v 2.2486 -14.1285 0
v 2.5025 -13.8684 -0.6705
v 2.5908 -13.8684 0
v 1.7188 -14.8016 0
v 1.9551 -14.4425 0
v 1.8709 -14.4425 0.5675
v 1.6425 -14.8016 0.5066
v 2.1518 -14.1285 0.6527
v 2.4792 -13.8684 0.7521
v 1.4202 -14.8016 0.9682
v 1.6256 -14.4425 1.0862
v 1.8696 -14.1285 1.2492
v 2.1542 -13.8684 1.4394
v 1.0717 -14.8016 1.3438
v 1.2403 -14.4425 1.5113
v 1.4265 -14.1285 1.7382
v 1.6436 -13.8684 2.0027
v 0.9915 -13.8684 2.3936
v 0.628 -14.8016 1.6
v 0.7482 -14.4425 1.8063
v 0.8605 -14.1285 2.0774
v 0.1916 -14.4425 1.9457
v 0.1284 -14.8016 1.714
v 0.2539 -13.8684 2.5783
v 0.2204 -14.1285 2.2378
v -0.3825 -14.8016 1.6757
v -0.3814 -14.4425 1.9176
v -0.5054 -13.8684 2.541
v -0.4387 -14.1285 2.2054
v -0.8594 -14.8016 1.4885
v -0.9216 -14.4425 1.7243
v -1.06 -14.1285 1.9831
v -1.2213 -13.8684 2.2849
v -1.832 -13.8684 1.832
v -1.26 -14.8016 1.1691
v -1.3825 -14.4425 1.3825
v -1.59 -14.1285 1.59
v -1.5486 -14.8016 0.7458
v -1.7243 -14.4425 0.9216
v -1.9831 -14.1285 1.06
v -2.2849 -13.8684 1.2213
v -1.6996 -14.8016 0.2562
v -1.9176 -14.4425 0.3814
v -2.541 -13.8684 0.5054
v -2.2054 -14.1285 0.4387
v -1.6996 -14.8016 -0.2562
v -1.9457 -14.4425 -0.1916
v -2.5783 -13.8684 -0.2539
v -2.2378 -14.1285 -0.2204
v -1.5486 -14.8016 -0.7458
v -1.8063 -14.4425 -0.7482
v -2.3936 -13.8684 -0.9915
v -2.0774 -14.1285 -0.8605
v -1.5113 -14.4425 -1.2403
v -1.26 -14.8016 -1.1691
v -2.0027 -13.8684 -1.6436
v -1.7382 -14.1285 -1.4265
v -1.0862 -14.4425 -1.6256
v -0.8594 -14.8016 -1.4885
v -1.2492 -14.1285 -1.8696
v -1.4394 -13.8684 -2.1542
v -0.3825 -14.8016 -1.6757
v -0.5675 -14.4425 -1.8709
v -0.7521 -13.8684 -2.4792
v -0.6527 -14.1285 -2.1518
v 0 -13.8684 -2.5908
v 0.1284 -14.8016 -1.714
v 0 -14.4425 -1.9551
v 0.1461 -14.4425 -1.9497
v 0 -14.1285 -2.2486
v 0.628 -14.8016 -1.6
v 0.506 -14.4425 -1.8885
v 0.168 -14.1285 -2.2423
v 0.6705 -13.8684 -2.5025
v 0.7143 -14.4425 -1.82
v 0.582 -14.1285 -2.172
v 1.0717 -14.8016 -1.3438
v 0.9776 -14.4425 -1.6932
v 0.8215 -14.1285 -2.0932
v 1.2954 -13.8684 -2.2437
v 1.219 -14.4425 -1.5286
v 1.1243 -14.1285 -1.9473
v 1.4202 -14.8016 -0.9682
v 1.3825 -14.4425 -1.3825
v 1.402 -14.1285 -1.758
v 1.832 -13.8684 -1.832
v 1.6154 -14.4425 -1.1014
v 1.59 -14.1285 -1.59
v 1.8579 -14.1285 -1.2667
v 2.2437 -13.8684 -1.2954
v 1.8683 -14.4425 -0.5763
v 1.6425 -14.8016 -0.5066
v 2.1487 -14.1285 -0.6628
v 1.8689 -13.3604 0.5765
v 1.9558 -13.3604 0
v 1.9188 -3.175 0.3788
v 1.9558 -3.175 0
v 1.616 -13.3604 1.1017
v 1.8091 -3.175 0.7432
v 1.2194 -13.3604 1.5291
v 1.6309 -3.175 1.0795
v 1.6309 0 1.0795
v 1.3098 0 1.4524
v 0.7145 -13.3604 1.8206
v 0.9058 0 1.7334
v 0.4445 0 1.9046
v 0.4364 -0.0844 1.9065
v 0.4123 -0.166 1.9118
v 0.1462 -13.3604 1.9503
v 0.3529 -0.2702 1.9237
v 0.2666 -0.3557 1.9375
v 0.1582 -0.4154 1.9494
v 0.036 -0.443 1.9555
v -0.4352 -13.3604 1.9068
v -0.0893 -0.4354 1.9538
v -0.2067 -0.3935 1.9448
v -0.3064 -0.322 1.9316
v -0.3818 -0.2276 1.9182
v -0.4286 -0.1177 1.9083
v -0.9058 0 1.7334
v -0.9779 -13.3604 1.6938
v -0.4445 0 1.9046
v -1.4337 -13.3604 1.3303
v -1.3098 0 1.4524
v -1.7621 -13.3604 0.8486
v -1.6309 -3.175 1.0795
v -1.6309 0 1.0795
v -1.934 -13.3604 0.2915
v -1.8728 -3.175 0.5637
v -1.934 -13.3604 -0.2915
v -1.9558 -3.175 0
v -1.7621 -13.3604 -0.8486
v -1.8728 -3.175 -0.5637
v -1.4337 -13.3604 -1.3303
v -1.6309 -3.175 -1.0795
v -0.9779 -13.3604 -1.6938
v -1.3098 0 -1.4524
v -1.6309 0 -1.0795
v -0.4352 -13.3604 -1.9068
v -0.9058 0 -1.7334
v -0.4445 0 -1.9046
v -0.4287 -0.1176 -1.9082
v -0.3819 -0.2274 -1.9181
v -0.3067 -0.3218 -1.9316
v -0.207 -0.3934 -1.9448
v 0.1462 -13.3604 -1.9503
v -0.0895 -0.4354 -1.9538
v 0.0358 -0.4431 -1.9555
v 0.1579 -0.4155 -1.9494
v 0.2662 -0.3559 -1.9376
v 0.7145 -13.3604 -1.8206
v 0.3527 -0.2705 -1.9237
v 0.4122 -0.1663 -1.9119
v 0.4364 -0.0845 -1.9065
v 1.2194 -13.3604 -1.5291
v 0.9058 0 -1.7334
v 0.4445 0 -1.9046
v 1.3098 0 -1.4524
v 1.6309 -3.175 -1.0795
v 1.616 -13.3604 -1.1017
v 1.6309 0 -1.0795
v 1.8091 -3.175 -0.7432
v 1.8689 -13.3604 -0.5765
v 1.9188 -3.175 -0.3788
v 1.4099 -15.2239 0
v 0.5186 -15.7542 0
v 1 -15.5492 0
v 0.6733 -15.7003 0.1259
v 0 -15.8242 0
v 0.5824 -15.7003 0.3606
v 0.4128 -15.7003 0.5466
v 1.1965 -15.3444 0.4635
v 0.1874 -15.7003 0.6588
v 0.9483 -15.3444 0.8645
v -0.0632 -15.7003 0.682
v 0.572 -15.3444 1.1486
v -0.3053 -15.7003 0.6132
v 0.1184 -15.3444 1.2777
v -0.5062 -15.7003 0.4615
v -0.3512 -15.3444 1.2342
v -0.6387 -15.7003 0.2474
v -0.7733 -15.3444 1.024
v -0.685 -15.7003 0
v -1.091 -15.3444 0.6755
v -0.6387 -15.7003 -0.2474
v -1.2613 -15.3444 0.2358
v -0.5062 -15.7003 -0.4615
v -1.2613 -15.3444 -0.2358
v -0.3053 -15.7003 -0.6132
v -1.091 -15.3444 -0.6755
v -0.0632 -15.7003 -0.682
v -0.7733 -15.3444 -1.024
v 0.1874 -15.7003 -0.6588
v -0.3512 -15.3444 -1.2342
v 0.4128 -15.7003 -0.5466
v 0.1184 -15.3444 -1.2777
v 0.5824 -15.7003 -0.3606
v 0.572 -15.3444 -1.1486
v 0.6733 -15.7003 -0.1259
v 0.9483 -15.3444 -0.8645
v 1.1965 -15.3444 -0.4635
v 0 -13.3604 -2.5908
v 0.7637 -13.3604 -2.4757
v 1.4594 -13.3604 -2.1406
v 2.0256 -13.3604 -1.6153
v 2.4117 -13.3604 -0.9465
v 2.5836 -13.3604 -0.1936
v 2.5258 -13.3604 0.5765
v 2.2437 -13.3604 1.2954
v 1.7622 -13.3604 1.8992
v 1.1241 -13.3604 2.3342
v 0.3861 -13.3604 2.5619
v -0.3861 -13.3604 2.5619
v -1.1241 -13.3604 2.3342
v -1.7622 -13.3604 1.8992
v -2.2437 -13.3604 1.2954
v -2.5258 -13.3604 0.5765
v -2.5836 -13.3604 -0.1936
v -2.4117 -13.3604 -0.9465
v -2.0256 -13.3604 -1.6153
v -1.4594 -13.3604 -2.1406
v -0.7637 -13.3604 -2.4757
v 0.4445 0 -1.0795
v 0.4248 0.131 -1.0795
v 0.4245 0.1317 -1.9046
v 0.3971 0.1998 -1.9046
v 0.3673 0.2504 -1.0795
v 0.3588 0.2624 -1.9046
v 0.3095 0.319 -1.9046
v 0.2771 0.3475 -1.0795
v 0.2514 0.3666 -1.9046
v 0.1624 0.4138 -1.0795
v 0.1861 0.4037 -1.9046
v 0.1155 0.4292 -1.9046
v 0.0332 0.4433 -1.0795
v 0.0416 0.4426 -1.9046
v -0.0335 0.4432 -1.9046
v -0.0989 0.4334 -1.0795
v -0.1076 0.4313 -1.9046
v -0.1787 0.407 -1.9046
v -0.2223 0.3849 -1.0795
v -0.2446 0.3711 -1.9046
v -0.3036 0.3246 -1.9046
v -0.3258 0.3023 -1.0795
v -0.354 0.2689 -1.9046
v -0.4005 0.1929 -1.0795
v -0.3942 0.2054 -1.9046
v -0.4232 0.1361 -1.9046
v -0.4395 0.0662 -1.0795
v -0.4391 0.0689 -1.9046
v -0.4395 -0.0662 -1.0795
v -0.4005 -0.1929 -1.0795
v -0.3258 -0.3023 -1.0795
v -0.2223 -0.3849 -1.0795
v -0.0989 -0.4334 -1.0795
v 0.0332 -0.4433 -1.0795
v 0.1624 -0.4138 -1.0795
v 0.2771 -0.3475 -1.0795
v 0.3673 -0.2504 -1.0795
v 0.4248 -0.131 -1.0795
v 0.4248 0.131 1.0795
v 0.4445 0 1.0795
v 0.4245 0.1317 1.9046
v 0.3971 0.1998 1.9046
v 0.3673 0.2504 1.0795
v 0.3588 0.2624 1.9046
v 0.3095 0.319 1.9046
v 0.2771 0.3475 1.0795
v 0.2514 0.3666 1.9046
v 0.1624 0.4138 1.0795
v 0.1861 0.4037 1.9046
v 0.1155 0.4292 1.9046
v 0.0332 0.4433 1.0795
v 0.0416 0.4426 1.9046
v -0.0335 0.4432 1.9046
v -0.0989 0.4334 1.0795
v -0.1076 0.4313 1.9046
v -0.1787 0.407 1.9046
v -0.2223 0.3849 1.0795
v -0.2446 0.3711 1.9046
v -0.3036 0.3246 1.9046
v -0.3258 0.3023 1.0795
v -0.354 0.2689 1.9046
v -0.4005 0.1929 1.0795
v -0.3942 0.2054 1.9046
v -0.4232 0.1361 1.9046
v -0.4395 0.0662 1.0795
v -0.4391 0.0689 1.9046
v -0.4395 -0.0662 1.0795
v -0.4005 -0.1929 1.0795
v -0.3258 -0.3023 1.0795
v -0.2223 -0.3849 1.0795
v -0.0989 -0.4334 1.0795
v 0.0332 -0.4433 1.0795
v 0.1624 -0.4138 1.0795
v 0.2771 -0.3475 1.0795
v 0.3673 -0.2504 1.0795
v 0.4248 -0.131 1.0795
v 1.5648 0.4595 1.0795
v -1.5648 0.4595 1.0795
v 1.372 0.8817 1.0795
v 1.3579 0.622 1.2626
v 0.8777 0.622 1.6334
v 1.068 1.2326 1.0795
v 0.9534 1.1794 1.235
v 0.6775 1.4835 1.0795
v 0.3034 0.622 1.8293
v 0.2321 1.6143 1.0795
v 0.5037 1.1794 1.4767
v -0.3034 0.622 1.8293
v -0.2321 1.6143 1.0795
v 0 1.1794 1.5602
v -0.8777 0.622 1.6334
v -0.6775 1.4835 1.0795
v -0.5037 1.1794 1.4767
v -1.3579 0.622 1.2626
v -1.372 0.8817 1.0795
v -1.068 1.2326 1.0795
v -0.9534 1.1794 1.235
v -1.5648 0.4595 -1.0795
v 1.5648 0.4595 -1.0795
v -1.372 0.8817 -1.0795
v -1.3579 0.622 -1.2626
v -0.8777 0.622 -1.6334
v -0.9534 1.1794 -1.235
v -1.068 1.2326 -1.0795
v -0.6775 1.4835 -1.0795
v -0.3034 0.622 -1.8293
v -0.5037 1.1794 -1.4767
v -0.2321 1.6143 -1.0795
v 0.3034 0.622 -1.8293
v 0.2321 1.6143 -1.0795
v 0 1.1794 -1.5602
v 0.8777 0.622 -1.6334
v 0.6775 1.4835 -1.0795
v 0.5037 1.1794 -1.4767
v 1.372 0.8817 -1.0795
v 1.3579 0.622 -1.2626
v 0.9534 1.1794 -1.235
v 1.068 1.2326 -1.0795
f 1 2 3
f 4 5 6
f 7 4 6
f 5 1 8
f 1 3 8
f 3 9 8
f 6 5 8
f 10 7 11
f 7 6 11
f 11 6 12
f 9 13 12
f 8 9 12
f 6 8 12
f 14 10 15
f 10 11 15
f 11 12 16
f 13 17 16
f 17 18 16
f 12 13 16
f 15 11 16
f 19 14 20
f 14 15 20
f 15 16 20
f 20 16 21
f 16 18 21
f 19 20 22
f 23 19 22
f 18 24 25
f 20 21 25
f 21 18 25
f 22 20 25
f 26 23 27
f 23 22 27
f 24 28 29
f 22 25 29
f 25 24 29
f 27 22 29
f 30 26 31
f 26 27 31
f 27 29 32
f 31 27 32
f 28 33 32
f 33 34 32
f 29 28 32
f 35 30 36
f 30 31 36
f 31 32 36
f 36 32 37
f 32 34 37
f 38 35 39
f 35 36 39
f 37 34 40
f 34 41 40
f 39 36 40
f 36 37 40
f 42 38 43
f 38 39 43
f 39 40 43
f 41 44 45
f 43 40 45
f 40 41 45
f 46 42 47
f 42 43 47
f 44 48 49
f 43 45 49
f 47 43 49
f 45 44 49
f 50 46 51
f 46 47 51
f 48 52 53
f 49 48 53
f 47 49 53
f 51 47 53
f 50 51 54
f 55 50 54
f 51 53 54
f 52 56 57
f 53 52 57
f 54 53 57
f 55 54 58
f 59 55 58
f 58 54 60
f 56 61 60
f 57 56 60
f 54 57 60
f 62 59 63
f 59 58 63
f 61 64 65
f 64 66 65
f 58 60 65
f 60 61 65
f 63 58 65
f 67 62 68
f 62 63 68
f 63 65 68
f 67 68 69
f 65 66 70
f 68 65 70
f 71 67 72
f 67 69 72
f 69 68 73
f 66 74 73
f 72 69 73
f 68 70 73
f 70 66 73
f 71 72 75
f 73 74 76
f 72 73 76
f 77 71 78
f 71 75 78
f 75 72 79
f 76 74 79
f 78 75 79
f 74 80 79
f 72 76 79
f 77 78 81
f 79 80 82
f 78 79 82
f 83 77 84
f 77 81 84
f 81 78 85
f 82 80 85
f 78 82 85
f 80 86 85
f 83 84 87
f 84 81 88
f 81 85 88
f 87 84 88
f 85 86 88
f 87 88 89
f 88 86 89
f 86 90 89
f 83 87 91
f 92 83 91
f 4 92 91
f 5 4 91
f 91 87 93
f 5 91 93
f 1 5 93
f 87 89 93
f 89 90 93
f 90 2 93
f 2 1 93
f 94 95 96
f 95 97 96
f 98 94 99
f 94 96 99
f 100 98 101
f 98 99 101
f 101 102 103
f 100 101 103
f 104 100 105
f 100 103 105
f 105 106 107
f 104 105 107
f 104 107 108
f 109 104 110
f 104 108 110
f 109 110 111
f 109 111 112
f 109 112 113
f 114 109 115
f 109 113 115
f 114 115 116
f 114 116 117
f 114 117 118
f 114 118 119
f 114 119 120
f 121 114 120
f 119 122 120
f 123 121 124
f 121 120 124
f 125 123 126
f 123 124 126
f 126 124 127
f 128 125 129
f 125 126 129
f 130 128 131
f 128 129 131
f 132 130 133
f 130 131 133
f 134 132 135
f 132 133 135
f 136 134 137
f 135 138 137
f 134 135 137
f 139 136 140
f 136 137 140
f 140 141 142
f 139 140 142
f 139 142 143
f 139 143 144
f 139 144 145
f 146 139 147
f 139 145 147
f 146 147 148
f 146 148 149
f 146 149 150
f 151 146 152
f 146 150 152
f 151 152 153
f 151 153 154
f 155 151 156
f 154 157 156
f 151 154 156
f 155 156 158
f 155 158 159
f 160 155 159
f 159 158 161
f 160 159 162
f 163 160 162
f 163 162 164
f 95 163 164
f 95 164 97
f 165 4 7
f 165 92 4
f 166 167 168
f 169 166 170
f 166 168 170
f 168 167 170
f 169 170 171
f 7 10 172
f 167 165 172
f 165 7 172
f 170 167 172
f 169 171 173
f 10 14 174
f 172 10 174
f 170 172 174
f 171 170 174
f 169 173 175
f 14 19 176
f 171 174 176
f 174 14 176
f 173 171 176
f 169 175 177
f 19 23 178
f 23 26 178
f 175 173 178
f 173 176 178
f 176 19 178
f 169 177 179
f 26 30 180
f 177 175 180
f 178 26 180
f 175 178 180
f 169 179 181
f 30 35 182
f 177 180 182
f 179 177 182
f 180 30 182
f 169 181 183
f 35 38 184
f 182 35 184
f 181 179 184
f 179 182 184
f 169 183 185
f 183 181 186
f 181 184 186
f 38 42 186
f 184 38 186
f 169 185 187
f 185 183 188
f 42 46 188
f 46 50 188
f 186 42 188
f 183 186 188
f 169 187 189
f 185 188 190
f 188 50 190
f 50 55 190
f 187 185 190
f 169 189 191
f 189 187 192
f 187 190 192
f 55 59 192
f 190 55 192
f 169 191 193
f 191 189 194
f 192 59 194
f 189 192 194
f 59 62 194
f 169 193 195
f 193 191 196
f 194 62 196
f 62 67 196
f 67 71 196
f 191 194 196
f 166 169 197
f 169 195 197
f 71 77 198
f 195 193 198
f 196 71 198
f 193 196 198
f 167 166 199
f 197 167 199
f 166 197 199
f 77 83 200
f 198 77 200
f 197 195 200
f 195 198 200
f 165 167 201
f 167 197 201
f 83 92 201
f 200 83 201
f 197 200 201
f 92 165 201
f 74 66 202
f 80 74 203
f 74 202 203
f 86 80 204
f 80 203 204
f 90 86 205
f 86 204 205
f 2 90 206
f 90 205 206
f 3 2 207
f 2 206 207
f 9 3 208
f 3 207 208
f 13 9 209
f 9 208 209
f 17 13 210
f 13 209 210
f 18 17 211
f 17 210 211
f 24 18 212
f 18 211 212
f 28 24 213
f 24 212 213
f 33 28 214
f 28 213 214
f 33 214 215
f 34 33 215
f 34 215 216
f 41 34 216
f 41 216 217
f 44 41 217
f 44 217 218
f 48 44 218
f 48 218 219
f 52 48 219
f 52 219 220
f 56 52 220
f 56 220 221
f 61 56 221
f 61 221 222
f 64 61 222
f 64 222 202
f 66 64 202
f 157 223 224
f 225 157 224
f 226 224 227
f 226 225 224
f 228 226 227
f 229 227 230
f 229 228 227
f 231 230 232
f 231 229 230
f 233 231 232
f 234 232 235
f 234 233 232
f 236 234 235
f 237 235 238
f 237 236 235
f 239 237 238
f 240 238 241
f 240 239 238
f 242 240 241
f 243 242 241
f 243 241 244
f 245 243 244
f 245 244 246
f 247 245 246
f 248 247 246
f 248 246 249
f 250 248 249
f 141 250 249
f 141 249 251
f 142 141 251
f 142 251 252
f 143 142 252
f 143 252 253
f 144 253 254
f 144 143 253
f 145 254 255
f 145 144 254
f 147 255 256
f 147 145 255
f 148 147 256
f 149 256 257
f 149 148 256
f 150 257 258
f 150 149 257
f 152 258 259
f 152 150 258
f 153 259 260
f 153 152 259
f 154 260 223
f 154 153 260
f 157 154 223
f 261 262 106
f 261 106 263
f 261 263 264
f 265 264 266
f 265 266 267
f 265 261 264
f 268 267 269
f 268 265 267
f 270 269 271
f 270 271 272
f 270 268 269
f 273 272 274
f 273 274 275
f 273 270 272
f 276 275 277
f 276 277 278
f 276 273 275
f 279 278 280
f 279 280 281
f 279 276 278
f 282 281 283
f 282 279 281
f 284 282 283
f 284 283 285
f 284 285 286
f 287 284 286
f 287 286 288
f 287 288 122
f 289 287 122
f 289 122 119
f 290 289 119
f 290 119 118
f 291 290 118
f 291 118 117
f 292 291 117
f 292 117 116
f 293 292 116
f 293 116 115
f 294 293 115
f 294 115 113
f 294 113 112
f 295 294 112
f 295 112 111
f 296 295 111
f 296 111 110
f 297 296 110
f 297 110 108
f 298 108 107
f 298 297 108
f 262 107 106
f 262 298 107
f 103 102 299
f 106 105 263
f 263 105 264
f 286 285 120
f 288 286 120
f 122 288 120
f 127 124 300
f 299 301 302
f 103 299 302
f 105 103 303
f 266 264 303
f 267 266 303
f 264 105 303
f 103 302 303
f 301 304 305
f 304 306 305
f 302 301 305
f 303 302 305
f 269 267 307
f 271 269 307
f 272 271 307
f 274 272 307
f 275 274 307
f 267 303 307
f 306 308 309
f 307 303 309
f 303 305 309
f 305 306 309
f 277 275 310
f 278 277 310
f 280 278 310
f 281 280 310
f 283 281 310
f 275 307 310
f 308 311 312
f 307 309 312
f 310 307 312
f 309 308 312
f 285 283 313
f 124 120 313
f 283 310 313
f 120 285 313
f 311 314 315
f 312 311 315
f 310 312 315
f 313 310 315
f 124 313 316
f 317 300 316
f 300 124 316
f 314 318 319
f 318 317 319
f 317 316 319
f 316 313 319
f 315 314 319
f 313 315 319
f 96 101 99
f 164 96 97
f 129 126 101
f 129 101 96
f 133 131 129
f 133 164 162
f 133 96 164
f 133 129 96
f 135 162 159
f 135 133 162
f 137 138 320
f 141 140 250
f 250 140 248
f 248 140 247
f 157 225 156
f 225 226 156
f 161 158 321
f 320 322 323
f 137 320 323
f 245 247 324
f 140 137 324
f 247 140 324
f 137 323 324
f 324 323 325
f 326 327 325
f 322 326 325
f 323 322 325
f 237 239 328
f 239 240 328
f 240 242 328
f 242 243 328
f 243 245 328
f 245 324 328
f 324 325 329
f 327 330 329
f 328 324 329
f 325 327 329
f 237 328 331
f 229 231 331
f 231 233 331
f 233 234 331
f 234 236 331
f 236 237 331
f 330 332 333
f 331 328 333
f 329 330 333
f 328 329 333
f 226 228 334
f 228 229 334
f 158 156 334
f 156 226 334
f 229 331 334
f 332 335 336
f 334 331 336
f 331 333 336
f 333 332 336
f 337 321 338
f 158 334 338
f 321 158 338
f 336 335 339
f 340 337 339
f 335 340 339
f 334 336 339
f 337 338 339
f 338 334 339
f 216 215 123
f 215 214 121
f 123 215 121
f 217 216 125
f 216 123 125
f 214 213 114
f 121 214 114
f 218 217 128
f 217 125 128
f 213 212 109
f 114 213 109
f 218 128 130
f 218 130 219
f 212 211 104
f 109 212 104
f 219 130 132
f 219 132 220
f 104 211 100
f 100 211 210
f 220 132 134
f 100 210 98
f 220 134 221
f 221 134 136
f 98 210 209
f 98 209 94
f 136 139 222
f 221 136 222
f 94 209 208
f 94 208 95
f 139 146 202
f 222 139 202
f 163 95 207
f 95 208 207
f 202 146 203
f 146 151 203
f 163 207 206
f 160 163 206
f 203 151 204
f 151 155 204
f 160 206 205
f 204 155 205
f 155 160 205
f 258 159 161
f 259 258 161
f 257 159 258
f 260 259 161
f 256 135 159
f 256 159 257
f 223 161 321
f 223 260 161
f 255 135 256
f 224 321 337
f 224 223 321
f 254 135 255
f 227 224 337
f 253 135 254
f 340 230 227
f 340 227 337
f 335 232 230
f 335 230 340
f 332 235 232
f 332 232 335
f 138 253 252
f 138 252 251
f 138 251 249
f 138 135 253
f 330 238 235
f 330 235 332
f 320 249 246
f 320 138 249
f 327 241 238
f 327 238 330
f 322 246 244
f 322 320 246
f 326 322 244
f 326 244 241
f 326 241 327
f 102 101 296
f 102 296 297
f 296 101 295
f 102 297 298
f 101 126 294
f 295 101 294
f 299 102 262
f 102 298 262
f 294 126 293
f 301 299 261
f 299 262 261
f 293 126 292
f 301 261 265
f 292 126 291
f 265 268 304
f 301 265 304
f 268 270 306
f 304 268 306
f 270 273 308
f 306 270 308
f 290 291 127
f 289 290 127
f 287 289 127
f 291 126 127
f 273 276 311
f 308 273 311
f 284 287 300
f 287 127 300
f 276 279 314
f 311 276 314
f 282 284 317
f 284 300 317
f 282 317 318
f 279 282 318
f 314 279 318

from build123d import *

# Parameters (mm, degrees)
CUT_EXTRUDE1_DEPTH      = 17.064109466
CUT_EXTRUDE1_DEPTH_BACK = 17.064109466
SKETCH2_W               = 2.159
SKETCH2_H               = 5.314367205
CUT_EXTRUDE2_DEPTH      = 17.064109466
CUT_EXTRUDE2_DEPTH_BACK = 17.064109466
SKETCH3_R               = 0.4445
BOSS_EXTRUDE8_START     = -0.508
SKETCH4_R               = 2.5908
SKETCH4_R_2             = 1.9558
BOSS_EXTRUDE8_DEPTH     = 0.508
FILLET1_R               = 2.54


with BuildPart() as part:
    # Sketch1 one side → Revolve1 (revolve)
    with BuildSketch(Plane.XY):
        with BuildLine():
            Line((1.9558, -13.8684), (1.9558, 0))
            ThreePointArc((1.9558, 0), (1.382959443, 1.382959443), (0, 1.9558))
            Line((0, 1.9558), (0, -15.8242))
            ThreePointArc((0, -15.8242), (1.382959443, -15.251359443), (1.9558, -13.8684))
        make_face()
    revolve(axis=Axis((0, 0, 0), (0, -1, 0)))

    # Sketch2 → Cut-Extrude1 (cut, two sides: drawn at the far end of the back side and taken through both)
    with BuildSketch(Plane(origin=(0, 0, 0), x_dir=(0, 0, -1), z_dir=(1, 0, 0)).offset(-CUT_EXTRUDE1_DEPTH_BACK)):
        with Locations((0, -0.517816398)):
            Rectangle(SKETCH2_W, SKETCH2_H)
    extrude(amount=CUT_EXTRUDE1_DEPTH + CUT_EXTRUDE1_DEPTH_BACK, mode=Mode.SUBTRACT)

    # Sketch3 → Cut-Extrude2 (cut, two sides: drawn at the far end of the back side and taken through both)
    with BuildSketch(Plane.XY.offset(-CUT_EXTRUDE2_DEPTH_BACK)):
        Circle(SKETCH3_R)
    extrude(amount=CUT_EXTRUDE2_DEPTH + CUT_EXTRUDE2_DEPTH_BACK, mode=Mode.SUBTRACT)

    # Sketch4 → Boss-Extrude8 (add)
    with BuildSketch(Plane(origin=(0, -13.8684, 0), x_dir=(-1, 0, 0), z_dir=(0, -1, 0)).offset(BOSS_EXTRUDE8_START)):
        with Locations(Location((0, 0, 0), (0, 0, 90))):
            Circle(SKETCH4_R)
        with Locations(Location((0, 0, 0), (0, 0, 213.500760385))):
            Circle(SKETCH4_R_2, mode=Mode.SUBTRACT)
    extrude(amount=BOSS_EXTRUDE8_DEPTH)

    # Fillet1
    # the kernel refuses this fillet: 2.54 mm, written as the material it adds along each edge
    with BuildSketch(Plane(origin=(0, -13.8684, 0), x_dir=(1, 0, 0), z_dir=(0, 0, -1))) as fillet1_piece_1:
        with BuildLine():
            CenterArc((3.951069608, 2.145056315), FILLET1_R, 208.497766198, 29.121746718)
            Line((2.5908, 0), (2.563594608, -0.042901126))
            ThreePointArc((2.563594608, -0.042901126), (2.2733, -0.0508), (1.9558, -0.0508))
            Line((1.9558, -0.0508), (1.905, 0))
            ThreePointArc((1.905, 0), (1.846394024, 0.46888603), (1.674182037, 0.908922167))
            Line((1.674182037, 0.908922167), (1.718826892, 0.933160092))
        make_face()
    revolve(axis=Axis((0, -13.8684, 0), (0, -1, 0)))


solid = part.part
